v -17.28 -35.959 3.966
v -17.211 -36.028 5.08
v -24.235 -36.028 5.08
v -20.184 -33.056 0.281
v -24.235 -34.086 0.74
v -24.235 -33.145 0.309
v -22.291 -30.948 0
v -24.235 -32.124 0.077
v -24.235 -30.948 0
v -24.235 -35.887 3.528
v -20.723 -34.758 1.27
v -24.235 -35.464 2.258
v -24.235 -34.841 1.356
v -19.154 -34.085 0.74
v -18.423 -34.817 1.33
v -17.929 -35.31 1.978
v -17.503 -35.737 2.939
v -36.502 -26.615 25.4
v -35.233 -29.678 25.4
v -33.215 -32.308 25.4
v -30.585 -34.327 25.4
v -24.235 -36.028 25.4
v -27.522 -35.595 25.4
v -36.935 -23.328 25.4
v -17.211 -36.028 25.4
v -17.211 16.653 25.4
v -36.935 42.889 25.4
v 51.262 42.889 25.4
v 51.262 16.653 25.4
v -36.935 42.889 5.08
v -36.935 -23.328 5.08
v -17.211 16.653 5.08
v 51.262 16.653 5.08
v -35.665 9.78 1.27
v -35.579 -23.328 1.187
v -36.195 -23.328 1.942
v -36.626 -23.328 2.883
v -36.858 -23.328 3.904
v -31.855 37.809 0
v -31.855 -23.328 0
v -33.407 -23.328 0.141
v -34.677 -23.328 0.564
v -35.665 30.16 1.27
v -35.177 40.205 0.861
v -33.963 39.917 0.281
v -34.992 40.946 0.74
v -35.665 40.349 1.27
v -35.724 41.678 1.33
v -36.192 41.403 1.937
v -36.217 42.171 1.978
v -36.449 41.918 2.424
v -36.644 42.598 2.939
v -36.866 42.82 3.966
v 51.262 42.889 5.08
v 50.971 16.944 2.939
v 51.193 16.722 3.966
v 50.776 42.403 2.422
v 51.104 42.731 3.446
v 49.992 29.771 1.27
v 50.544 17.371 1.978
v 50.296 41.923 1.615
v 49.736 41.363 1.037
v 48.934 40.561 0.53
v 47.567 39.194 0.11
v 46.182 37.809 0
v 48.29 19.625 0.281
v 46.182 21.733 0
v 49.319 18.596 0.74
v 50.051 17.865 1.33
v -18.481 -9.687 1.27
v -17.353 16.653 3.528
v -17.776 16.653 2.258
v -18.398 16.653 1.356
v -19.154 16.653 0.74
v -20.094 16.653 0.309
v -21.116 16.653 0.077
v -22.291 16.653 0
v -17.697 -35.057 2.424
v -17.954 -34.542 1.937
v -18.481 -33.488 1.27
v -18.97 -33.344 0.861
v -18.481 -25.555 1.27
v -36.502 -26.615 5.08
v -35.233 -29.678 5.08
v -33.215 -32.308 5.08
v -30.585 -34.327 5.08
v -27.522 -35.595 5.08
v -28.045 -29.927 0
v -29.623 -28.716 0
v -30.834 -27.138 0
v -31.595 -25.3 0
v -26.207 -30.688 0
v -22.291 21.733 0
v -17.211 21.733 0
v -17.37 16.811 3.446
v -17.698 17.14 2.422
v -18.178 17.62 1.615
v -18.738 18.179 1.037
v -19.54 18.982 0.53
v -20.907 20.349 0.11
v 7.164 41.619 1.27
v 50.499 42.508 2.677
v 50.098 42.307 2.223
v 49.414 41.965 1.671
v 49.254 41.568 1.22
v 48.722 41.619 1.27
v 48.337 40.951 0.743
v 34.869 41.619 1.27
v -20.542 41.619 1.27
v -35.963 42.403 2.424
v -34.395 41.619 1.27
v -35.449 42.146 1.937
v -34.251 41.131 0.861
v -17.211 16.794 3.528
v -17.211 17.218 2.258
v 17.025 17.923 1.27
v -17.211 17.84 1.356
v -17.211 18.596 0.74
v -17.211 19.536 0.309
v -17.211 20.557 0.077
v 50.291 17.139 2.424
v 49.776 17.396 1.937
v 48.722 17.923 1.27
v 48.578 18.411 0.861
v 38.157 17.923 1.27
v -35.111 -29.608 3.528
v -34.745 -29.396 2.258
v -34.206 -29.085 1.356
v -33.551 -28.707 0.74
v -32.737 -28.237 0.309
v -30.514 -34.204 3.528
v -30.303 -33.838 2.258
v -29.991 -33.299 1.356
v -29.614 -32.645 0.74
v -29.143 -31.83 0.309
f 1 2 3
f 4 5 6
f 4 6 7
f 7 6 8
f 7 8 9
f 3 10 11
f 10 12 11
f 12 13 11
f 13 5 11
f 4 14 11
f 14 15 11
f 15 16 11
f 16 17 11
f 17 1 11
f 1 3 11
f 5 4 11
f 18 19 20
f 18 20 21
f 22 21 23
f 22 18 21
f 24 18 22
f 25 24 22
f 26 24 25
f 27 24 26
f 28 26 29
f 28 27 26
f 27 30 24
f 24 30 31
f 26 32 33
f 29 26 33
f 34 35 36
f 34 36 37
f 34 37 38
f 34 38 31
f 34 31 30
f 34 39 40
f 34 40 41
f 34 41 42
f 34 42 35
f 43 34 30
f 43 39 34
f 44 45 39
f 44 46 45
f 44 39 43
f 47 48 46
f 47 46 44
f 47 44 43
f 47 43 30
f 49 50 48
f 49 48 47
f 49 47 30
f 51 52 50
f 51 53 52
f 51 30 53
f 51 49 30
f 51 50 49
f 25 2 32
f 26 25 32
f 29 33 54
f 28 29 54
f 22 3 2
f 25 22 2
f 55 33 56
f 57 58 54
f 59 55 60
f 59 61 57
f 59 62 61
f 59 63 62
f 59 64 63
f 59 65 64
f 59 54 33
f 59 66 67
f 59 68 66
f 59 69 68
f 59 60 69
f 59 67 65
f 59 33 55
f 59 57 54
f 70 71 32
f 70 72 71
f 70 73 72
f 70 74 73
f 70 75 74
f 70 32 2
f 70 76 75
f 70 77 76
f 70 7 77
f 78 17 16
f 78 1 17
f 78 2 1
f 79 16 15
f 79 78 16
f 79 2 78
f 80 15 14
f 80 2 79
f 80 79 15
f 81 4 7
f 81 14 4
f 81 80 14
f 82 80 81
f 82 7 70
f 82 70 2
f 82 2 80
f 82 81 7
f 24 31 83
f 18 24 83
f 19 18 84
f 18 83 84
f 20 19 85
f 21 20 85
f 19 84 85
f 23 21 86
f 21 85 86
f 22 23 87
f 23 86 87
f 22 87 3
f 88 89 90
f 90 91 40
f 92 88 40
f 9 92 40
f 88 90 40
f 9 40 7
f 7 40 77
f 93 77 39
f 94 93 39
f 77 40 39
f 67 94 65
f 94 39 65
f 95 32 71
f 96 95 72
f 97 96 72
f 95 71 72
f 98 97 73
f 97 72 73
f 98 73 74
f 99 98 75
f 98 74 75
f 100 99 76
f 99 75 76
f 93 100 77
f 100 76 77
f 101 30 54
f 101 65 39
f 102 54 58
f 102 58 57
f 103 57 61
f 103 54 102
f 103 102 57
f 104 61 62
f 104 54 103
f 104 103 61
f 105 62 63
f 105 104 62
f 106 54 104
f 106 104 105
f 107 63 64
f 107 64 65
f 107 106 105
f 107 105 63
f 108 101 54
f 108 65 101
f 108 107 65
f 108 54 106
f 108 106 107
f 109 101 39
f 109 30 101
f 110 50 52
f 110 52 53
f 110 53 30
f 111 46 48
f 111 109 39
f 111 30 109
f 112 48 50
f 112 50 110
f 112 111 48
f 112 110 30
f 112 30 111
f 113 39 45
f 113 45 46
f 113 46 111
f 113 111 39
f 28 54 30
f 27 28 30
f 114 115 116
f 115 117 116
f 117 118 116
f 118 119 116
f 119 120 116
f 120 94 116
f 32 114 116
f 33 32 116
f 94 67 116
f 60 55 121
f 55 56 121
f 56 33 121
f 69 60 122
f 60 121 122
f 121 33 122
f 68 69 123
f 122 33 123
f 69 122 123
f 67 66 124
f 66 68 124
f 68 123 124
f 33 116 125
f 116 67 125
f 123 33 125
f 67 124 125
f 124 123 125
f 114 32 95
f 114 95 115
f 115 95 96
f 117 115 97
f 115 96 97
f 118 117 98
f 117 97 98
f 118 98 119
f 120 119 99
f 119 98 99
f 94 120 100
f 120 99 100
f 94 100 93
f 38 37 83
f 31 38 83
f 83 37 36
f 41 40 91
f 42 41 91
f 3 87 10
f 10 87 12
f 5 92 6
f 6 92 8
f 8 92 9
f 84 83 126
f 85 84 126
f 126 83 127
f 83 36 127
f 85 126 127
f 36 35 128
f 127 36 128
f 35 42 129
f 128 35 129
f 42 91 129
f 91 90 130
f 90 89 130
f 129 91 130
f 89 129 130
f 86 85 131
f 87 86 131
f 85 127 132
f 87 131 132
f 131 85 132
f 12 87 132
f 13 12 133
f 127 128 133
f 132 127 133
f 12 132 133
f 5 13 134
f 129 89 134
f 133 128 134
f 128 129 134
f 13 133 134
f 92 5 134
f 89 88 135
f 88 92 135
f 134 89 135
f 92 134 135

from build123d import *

# Parameters (mm, degrees)
F1_DEPTH     = 25.4
F2_T1_DEPTH  = 78.9172077388
F2_T3_DEPTH  = 19.7233948857
F2_T5_DEPTH  = 65.3813702494
F2_T7_DEPTH  = 81.1736724943
F2_T9_DEPTH  = 51.6358374894
F2_T11_DEPTH = 113.59706738
F2_T14_ANGLE = 90
F2_T19_DEPTH = 93.8736724943
F2_T23_DEPTH = 78.0813702494


# Not quite as in the source:
# - a fillet or chamfer that OpenCascade refuses, or shapes differently, is made with other operations: its cross-section is extruded or revolved along the edge and cut away or added


with BuildPart() as f1:
    # F0 (on Top) → F1 (new body)
    with BuildSketch(Plane.XY):
        with BuildLine():
            Line((-17.2114539891, 42.8890809417), (-36.9348488748, 42.8890809417))
            Line((-36.9348488748, 42.8890809417), (-36.9348488748, 16.6532434523))
            Line((-36.9348488748, 16.6532434523), (-36.9348488748, -23.3281267971))
            ThreePointArc((-36.9348488748, -23.3281267971), (-33.2151049959, -32.3083829181), (-24.2348488748, -36.0281267971))
            Line((-24.2348488748, -36.0281267971), (-17.2114539891, -36.0281267971))
            Line((-17.2114539891, -36.0281267971), (-17.2114539891, 16.6532434523))
            Line((-17.2114539891, 16.6532434523), (51.2622185051, 16.6532434523))
            Line((51.2622185051, 16.6532434523), (51.2622185051, 42.8890809417))
            Line((51.2622185051, 42.8890809417), (-17.2114539891, 42.8890809417))
        make_face()
    extrude(amount=F1_DEPTH)

    # F2: fillet of radius 5.08 on 7 edges, made by hand

    # F2_s2 → F2_t1 (cut)
    with BuildSketch(Plane.XZ.offset(-55.5890809417)):
        with BuildLine():
            add(Edge.make_bspline(
                [(-31.8548488748, 0), (-36.9348488748, 0), (-36.9348488748, 5.08)],
                knots=[0, 0, 0, 1, 1, 1], degree=2, weights=[1, 1, 1]))
            Line((-36.9348488748, 5.08), (-36.9348488748, 0))
            Line((-36.9348488748, 0), (-31.8548488748, 0))
        make_face()
    extrude(amount=F2_T1_DEPTH, mode=Mode.SUBTRACT)

    # F2_s4 → F2_t3 (cut)
    with BuildSketch(Plane.YZ.offset(-24.2348488748)):
        with BuildLine():
            add(Edge.make_bspline(
                [(-36.0281267971, 5.08), (-36.0281267971, 0), (-30.9481267971, 0)],
                knots=[0, 0, 0, 1, 1, 1], degree=2, weights=[1, 1, 1]))
            Line((-30.9481267971, 0), (-36.0281267971, 0))
            Line((-36.0281267971, 0), (-36.0281267971, 5.08))
        make_face()
    extrude(amount=F2_T3_DEPTH, mode=Mode.SUBTRACT)

    # F2_s6 → F2_t5 (cut)
    with BuildSketch(Plane.XZ.offset(-16.6532434523)):
        with BuildLine():
            add(Edge.make_bspline(
                [(-17.2114539891, 5.08), (-17.2114539891, 0), (-22.2914539891, 0)],
                knots=[0, 0, 0, 1, 1, 1], degree=2, weights=[1, 1, 1]))
            Line((-22.2914539891, 0), (-17.2114539891, 0))
            Line((-17.2114539891, 0), (-17.2114539891, 5.08))
        make_face()
    extrude(amount=F2_T5_DEPTH, mode=Mode.SUBTRACT)

    # F2_s8 → F2_t7 (cut)
    with BuildSketch(Plane.YZ.offset(-17.2114539891)):
        with BuildLine():
            add(Edge.make_bspline(
                [(16.6532434523, 5.08), (16.6532434523, 0), (21.7332434523, 0)],
                knots=[0, 0, 0, 1, 1, 1], degree=2, weights=[1, 1, 1]))
            Line((21.7332434523, 0), (16.6532434523, 0))
            Line((16.6532434523, 0), (16.6532434523, 5.08))
        make_face()
    extrude(amount=F2_T7_DEPTH, mode=Mode.SUBTRACT)

    # F2_s10 → F2_t9 (cut)
    with BuildSketch(Plane.XZ.offset(-55.5890809417)):
        with BuildLine():
            add(Edge.make_bspline(
                [(51.2622185051, 5.08), (51.2622185051, 0), (46.1822185051, 0)],
                knots=[0, 0, 0, 1, 1, 1], degree=2, weights=[1, 1, 1]))
            Line((46.1822185051, 0), (51.2622185051, 0))
            Line((51.2622185051, 0), (51.2622185051, 5.08))
        make_face()
    extrude(amount=F2_T9_DEPTH, mode=Mode.SUBTRACT)

    # F2_s12 → F2_t11 (cut)
    with BuildSketch(Plane.YZ.offset(-49.6348488748)):
        with BuildLine():
            add(Edge.make_bspline(
                [(42.8890809417, 5.08), (42.8890809417, 0), (37.8090809417, 0)],
                knots=[0, 0, 0, 1, 1, 1], degree=2, weights=[1, 1, 1]))
            Line((37.8090809417, 0), (42.8890809417, 0))
            Line((42.8890809417, 0), (42.8890809417, 5.08))
        make_face()
    extrude(amount=F2_T11_DEPTH, mode=Mode.SUBTRACT)

    # F2_s13 → F2_t14 (revolve, cut)
    with BuildSketch(Plane.XZ.offset(23.3281267971)):
        with BuildLine():
            add(Edge.make_bspline(
                [(-36.9348488748, 5.08), (-36.9348488748, 0), (-31.8548488748, 0)],
                knots=[0, 0, 0, 1, 1, 1], degree=2, weights=[1, 1, 1]))
            Line((-31.8548488748, 0), (-36.9348488748, 0))
            Line((-36.9348488748, 0), (-36.9348488748, 5.08))
        make_face()
    revolve(axis=Axis((-24.2348488748, -23.3281267971, 0), (0, 0, 1)), revolution_arc=F2_T14_ANGLE, mode=Mode.SUBTRACT)


with BuildPart() as f2_tool17:
    # F2_s18 → F2_t19 (new body)
    with BuildSketch(Plane.YZ.offset(-29.9114539891)):
        with BuildLine():
            add(Edge.make_bspline(
                [(16.6532434523, 5.08), (16.6532434523, 0), (21.7332434523, 0)],
                knots=[0, 0, 0, 1, 1, 1], degree=2, weights=[1, 1, 1]))
            Line((21.7332434523, 0), (16.6532434523, 0))
            Line((16.6532434523, 0), (16.6532434523, 5.08))
        make_face()
    extrude(amount=F2_T19_DEPTH)

    split(bisect_by=Plane.YZ.offset(-17.2114539891), keep=Keep.BOTTOM)


with BuildPart() as f2_tool21:
    # F2_s22 → F2_t23 (new body)
    with BuildSketch(Plane.XZ.offset(48.7281267971)):
        with BuildLine():
            add(Edge.make_bspline(
                [(-17.2114539891, 5.08), (-17.2114539891, 0), (-22.2914539891, 0)],
                knots=[0, 0, 0, 1, 1, 1], degree=2, weights=[1, 1, 1]))
            Line((-22.2914539891, 0), (-17.2114539891, 0))
            Line((-17.2114539891, 0), (-17.2114539891, 5.08))
        make_face()
    extrude(amount=-F2_T23_DEPTH)

    split(bisect_by=Plane.XZ.offset(-16.6532434523), keep=Keep.BOTTOM)


with BuildPart() as f2_tool17_1:
    add(f2_tool17.part)

    # F2_t25: intersect F2_tool21
    add(f2_tool21.part, mode=Mode.INTERSECT)


with BuildPart() as f1_1:
    add(f1.part)

    # F2_t15: cut F2_tool17
    add(f2_tool17_1.part, mode=Mode.SUBTRACT)


solid = f1_1.part
